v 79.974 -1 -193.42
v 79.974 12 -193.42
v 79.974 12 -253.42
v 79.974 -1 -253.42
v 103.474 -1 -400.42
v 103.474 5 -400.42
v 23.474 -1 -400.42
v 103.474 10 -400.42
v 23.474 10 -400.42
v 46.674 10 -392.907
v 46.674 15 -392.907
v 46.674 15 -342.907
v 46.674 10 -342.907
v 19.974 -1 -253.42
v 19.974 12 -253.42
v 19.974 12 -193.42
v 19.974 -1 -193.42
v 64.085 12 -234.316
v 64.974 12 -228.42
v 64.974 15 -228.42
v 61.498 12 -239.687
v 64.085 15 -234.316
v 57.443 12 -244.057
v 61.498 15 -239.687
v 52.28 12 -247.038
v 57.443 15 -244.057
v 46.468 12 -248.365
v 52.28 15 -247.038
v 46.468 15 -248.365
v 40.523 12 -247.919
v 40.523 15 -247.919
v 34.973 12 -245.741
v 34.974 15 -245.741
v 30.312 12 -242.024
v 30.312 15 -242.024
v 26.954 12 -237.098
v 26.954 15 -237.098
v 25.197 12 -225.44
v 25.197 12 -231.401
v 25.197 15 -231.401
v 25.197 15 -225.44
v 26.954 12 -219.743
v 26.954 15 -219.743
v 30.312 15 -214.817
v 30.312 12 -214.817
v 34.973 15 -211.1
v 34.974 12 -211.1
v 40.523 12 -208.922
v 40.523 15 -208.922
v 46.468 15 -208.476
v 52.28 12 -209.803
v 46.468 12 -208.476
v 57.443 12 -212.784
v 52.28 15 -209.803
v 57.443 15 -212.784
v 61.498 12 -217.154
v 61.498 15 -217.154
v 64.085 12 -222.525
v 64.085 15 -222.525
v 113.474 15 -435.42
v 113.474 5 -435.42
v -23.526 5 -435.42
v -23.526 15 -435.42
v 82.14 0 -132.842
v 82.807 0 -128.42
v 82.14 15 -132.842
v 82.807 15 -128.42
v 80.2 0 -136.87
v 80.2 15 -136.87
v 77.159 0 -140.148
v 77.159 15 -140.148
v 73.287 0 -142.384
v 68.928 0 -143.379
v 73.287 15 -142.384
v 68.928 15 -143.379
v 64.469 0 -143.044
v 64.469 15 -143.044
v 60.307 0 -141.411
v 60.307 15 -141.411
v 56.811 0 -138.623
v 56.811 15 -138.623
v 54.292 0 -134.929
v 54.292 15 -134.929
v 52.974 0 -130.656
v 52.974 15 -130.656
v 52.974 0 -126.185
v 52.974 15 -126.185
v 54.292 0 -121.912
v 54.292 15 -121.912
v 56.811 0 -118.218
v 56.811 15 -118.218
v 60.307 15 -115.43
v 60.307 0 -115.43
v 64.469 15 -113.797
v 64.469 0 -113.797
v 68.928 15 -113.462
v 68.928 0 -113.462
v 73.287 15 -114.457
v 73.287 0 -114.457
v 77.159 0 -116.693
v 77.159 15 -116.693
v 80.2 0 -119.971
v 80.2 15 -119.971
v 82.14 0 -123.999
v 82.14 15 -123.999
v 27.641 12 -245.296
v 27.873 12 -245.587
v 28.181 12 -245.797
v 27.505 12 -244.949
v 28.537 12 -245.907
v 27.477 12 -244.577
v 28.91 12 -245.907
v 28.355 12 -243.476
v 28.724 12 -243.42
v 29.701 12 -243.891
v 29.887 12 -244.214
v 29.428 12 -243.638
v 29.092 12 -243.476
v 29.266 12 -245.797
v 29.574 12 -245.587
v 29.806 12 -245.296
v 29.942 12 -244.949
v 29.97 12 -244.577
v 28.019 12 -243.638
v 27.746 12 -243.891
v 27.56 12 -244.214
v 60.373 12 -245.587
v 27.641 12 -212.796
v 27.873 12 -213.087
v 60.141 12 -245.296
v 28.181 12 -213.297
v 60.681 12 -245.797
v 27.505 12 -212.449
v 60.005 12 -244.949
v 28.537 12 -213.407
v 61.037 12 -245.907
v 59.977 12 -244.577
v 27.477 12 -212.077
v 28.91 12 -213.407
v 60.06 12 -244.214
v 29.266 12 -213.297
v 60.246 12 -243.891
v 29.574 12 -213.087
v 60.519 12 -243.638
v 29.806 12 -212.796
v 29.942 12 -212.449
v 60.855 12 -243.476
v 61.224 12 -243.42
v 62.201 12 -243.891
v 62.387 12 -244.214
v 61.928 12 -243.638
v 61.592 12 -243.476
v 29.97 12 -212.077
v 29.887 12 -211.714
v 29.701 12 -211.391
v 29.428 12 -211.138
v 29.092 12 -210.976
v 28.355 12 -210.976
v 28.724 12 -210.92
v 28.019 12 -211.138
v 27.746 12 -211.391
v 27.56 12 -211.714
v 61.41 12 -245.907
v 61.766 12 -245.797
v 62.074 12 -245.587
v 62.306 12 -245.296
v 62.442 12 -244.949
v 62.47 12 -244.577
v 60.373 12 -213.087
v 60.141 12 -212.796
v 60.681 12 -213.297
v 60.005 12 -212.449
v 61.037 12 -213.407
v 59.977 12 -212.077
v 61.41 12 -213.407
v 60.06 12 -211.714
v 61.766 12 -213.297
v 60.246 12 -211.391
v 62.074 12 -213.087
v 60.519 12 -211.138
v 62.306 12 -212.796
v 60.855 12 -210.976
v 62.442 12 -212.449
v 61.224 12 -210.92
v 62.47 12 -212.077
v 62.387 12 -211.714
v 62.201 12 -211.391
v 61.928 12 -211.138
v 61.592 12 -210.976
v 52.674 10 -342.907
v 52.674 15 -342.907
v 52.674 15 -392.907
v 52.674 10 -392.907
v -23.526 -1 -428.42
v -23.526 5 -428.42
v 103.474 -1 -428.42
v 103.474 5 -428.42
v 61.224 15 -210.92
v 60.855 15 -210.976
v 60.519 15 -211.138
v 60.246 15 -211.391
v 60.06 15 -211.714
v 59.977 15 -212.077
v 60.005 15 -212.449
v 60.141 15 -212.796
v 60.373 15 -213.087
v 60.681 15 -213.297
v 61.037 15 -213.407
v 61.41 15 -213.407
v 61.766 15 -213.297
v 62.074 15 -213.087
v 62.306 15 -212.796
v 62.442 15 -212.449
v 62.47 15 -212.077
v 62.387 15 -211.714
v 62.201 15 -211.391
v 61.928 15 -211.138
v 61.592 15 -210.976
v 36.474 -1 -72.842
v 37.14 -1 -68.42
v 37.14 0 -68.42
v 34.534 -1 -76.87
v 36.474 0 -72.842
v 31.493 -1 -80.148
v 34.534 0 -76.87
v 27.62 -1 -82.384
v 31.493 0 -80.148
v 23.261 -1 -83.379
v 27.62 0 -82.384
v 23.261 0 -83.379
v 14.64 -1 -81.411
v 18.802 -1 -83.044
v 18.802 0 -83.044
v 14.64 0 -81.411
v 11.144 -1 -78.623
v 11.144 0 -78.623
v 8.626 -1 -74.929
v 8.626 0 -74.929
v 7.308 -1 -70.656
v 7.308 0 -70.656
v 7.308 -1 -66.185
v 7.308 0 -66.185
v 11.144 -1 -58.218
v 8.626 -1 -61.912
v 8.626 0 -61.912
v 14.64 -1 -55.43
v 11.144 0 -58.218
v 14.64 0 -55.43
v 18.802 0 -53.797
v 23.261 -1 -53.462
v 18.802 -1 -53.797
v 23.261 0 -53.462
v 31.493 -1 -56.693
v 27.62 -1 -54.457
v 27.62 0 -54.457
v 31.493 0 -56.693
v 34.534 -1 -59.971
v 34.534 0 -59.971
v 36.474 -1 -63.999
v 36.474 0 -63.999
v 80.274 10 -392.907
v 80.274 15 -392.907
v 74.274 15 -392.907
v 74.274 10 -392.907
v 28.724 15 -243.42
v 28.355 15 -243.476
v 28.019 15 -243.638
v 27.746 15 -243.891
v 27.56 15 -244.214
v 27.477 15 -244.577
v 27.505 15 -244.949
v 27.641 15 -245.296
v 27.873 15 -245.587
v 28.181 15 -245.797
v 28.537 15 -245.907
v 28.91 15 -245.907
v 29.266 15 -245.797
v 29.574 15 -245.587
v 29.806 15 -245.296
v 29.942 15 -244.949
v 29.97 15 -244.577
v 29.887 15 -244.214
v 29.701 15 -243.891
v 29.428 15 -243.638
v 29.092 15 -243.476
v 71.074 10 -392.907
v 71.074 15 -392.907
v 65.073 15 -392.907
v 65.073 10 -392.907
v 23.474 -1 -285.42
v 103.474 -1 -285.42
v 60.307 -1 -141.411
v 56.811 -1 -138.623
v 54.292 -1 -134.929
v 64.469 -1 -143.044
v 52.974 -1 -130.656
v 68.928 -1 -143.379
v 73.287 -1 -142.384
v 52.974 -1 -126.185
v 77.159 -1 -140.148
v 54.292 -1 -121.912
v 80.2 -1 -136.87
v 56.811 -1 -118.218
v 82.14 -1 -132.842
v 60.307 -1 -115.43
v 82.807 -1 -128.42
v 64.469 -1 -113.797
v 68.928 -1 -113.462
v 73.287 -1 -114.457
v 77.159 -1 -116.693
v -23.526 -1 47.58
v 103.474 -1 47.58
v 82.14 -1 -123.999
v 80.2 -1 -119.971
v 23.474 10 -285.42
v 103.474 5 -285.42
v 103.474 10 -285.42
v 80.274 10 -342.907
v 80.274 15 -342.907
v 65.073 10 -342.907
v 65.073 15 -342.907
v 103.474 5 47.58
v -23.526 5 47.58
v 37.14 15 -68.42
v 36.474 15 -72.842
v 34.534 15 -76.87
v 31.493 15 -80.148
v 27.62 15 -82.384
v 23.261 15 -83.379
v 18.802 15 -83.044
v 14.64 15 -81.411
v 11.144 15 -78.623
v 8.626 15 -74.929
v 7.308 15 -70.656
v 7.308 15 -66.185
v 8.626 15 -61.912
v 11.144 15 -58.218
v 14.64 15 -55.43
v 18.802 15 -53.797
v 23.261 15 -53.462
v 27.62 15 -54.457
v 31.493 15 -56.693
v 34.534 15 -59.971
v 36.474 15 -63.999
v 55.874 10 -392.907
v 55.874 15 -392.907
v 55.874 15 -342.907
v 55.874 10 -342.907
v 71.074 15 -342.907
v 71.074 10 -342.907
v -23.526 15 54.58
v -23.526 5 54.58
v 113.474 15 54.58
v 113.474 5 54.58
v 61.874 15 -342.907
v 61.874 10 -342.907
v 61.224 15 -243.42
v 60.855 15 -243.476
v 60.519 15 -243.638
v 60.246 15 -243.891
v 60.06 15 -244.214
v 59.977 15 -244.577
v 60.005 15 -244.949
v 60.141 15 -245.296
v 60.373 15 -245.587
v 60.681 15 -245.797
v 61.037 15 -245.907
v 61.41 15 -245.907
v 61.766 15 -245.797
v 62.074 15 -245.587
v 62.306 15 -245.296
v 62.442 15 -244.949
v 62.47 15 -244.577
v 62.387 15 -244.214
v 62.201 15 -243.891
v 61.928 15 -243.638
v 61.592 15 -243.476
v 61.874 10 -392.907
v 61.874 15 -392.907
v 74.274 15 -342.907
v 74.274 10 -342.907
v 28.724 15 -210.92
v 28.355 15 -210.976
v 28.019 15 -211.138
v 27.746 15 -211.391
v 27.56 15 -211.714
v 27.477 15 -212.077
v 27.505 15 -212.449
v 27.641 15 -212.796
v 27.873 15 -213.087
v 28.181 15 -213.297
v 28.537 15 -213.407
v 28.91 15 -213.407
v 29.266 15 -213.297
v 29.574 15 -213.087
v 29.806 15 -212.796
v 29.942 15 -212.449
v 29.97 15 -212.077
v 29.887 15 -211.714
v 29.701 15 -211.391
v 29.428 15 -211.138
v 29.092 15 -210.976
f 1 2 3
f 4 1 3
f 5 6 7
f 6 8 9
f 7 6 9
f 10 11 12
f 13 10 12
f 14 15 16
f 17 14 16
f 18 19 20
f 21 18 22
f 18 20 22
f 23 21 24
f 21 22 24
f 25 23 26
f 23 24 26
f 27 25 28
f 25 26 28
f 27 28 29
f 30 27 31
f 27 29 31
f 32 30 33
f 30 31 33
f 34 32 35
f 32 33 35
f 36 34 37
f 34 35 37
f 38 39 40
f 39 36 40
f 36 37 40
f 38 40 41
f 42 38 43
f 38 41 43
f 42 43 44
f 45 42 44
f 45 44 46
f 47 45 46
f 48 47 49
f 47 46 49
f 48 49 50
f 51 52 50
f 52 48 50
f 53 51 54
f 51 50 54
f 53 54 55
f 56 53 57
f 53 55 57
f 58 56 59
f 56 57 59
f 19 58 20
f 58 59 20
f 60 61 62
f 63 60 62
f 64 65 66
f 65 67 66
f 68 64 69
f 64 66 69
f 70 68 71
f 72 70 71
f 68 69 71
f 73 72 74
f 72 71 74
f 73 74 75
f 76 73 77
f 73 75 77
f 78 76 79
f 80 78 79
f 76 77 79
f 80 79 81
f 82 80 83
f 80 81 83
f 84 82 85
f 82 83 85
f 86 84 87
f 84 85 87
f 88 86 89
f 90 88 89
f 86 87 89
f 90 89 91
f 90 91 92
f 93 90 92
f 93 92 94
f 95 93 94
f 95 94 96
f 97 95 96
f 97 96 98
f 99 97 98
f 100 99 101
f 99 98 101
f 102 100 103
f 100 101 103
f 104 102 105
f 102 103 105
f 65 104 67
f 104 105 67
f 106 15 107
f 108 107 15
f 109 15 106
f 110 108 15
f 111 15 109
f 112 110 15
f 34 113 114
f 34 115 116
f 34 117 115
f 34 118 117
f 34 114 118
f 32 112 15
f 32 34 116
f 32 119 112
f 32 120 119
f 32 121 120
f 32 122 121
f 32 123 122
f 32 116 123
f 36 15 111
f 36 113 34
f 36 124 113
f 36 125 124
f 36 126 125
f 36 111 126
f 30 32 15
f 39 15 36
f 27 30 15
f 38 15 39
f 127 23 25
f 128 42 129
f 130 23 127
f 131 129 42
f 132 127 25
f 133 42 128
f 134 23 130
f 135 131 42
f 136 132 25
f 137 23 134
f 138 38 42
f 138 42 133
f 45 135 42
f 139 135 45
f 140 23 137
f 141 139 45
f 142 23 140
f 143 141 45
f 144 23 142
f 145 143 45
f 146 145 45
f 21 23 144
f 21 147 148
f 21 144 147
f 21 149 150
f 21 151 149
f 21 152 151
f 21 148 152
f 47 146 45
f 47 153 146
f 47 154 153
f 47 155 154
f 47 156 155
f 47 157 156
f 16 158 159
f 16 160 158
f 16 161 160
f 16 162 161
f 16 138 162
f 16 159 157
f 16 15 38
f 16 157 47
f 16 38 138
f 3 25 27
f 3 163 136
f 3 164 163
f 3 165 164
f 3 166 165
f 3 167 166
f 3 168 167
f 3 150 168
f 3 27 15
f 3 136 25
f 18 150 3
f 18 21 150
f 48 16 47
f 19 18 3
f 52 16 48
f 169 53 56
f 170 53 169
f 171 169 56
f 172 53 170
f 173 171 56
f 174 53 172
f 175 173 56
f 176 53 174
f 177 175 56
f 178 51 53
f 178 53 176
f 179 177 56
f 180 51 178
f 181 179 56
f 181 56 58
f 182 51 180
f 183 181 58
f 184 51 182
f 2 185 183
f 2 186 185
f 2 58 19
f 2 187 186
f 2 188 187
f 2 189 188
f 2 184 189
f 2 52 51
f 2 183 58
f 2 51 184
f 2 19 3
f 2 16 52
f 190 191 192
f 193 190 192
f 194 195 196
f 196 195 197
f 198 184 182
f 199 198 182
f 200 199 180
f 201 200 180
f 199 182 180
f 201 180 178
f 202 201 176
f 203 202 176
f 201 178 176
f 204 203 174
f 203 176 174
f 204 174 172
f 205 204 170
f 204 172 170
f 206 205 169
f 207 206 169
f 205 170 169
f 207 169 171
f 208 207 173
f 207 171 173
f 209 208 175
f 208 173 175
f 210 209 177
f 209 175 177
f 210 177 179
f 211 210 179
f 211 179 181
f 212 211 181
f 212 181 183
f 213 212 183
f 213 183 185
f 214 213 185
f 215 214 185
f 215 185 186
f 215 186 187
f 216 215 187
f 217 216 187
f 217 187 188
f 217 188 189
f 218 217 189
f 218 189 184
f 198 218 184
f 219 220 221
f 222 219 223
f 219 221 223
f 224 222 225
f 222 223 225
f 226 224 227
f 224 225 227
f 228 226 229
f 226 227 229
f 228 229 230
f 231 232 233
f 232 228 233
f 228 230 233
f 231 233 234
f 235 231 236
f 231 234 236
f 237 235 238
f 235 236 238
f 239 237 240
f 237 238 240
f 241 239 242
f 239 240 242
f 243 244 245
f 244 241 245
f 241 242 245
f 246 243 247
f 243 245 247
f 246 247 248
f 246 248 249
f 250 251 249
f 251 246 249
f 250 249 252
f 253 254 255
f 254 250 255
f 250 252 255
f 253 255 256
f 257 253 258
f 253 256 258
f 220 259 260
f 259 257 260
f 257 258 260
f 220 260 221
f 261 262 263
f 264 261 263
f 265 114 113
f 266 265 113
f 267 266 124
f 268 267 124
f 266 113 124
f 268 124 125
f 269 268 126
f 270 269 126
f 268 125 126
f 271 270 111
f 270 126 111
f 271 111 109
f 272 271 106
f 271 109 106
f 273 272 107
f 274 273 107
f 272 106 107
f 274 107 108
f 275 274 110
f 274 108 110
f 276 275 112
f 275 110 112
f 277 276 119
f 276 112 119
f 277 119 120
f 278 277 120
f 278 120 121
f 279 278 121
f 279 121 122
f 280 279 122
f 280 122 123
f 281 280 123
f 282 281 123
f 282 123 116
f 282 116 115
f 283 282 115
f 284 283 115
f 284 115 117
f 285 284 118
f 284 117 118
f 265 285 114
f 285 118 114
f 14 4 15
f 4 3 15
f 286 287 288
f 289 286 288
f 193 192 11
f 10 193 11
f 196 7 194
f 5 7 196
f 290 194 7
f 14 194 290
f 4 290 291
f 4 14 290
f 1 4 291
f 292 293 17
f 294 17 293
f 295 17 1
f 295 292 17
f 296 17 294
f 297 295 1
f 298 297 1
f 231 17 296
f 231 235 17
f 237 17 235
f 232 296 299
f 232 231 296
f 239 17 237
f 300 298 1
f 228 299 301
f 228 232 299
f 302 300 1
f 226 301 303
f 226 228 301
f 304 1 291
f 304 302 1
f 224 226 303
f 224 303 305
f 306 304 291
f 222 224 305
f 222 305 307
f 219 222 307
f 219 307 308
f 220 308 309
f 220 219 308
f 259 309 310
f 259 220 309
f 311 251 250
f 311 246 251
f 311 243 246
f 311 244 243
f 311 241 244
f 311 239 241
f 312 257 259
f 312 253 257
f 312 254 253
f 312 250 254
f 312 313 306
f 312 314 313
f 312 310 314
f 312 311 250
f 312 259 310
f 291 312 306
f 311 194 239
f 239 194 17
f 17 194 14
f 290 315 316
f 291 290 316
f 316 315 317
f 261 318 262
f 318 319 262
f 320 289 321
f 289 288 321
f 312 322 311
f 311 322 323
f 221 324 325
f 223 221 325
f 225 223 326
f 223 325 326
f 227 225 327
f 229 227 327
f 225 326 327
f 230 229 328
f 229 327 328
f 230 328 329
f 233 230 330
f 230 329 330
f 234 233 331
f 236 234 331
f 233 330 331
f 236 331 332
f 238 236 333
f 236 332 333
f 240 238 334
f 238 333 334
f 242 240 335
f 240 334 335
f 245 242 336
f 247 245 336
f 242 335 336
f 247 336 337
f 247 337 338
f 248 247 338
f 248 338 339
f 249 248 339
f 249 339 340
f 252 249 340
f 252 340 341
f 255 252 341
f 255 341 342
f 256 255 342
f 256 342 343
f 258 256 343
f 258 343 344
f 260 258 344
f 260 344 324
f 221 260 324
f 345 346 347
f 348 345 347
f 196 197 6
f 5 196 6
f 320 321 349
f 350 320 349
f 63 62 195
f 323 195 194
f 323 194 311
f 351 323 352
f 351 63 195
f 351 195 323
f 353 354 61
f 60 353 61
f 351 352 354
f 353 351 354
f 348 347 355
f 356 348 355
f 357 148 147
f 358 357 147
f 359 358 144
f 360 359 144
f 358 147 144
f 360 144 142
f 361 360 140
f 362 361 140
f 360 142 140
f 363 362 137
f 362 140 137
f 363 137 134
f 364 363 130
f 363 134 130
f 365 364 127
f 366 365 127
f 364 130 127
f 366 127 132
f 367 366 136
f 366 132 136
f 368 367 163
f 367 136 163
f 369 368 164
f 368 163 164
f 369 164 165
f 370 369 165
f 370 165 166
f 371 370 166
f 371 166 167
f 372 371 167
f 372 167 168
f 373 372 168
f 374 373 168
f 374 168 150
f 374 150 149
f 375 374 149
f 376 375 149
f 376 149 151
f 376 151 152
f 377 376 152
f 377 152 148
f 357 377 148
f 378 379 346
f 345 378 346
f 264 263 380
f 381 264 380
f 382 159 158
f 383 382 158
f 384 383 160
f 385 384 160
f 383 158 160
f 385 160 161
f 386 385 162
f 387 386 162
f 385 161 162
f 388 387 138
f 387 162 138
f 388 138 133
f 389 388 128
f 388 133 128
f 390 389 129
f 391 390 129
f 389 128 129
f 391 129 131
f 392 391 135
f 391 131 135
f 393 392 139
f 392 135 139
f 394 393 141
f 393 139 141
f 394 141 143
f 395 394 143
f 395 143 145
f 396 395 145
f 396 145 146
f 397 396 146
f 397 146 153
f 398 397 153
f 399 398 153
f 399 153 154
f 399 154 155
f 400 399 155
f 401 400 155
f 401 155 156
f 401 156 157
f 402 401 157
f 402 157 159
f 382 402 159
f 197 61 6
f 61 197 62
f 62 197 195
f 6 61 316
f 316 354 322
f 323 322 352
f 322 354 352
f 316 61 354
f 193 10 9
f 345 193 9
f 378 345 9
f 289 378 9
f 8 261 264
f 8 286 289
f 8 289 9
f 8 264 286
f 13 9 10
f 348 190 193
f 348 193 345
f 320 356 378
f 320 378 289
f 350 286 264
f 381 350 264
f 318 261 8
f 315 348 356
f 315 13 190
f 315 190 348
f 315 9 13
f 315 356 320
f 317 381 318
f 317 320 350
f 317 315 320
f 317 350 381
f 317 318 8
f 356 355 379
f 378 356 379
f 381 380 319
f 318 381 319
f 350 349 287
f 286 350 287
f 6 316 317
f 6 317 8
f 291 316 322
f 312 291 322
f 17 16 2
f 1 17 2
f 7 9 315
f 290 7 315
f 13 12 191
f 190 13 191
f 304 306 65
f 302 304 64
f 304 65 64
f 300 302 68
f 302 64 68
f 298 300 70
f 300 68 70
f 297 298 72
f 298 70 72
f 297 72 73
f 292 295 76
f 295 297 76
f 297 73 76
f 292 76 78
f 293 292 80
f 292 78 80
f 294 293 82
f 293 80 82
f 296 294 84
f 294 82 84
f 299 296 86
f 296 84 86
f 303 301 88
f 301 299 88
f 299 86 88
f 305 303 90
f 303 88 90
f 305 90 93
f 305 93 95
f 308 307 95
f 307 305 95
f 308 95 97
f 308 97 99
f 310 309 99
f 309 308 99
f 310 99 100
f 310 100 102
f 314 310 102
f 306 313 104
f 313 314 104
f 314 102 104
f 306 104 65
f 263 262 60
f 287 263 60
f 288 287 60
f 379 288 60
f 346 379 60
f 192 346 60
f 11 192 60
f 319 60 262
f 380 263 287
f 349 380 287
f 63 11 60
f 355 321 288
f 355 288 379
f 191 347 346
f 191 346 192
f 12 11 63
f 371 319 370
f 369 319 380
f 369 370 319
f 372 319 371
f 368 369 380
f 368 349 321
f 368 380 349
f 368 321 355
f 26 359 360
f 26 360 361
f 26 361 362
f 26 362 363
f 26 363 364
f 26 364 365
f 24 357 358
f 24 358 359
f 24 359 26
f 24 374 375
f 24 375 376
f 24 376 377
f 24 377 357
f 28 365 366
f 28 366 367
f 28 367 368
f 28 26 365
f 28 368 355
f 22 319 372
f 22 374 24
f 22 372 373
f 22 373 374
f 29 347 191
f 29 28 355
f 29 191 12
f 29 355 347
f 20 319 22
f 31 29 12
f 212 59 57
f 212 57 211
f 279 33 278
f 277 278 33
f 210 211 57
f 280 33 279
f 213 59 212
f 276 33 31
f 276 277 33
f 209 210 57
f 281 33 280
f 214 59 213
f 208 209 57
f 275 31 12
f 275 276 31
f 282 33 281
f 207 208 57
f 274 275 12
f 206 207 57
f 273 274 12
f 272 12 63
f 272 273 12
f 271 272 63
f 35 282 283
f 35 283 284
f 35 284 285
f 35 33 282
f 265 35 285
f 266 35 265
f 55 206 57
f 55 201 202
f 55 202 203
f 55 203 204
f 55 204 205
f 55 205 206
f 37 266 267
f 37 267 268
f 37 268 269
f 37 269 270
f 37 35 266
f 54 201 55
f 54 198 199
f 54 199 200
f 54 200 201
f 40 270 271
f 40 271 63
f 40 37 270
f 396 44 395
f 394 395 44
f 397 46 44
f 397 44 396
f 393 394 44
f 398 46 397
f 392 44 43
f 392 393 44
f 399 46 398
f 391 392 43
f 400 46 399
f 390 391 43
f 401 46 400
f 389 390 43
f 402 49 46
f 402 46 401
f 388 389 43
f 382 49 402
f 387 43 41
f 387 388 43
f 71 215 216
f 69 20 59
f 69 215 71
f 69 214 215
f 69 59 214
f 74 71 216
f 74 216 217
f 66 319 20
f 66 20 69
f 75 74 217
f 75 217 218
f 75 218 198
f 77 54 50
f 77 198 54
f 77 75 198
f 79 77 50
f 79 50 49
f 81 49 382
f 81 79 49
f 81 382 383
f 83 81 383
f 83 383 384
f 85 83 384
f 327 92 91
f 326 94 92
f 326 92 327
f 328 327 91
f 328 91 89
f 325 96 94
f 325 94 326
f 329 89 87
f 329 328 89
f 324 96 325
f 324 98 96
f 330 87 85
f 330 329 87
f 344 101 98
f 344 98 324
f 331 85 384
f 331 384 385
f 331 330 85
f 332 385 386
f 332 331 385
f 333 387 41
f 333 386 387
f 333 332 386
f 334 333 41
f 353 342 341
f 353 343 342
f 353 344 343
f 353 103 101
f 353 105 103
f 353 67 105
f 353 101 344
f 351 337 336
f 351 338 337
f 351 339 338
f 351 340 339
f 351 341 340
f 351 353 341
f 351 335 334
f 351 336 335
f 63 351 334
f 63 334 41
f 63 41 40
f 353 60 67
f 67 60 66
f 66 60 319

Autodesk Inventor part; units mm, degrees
ref_plane "YZ Plane" through (0, 0, 0) normal (1, 0, 0) x (0, 1, 0)
ref_plane "XZ Plane" through (0, 0, 0) normal (0, 1, 0) x (-1, 0, 0)
ref_plane "XY Plane" through (0, 0, 0) normal (0, 0, 1) x (1, 0, 0)
sketch "Sketch1" plane through (0, 0, 0) normal (0, 1, 0) x (-1, 0, 0)
  line L0 (23.5265, 54.5795) -> (-113.4735, 54.5795)
  line L1 (-113.4735, 54.5795) -> (-113.4735, -435.4205)
  line L2 (-113.4735, -435.4205) -> (23.5265, -435.4205)
  line L3 (23.5265, -435.4205) -> (23.5265, 54.5795)
  point P0 (0, 0)
  dimension "d0" = 137
  dimension "d1" = 490
extrude "Extrusion1" add sketch "Sketch1" along normal blind 15
sketch "Sketch2" plane through (-23.5265, 0, 54.5795) normal (0, 0, 1) x (1, 0, 0)
  line L0 (137, 0) -> (0, 0) projected
  line L1 (0, 0) -> (127, 0)
  line L2 (127, 0) -> (127, 5)
  line L3 (127, 5) -> (0, 5)
  line L4 (0, 5) -> (0, 0)
  point P0 (23.5265, 0)
  dimension "d4" = 127
  dimension "d5" = 5
extrude "Extrusion2" cut sketch "Sketch2" against normal blind 7
sketch "Sketch3" plane through (113.4735, 0, -435.4205) normal (0, 0, -1) x (-1, 0, 0)
  line L0 (0, 0) -> (137, 0) projected
  line L1 (0, 0) -> (137, 0)
  line L2 (137, 0) -> (137, 5)
  line L3 (137, 5) -> (0, 5)
  line L4 (0, 5) -> (0, 0)
  point P0 (113.4735, 0)
  dimension "d8" = 137
  dimension "d9" = 5
extrude "Extrusion3" cut sketch "Sketch3" against normal blind 7
sketch "Sketch4" plane through (0, 0, 0) normal (0, -1, 0) x (1, 0, 0)
  line L0 (-23.5265, -428.4205) -> (113.4735, -428.4205) projected
  line L1 (103.4735, 47.5795) -> (-23.5265, 47.5795) projected
  line L2 (113.4735, -428.4205) -> (103.4735, -428.4205)
  line L3 (103.4735, -428.4205) -> (103.4735, 47.5795)
  line L4 (103.4735, 47.5795) -> (113.4735, 47.5795)
  line L5 (113.4735, 47.5795) -> (113.4735, -428.4205)
  point P0 (0, 0)
  point P1 (-13.5265, -428.4205)
  dimension "d12" = 10
  dimension "d13" = 476
extrude "Extrusion4" cut sketch "Sketch4" against normal blind 5
sketch "Sketch5" plane through (0, 15, 0) normal (0, 1, 0) x (1, 0, 0)
  circle A0 centre (22.1402, 68.4205) radius 15
  circle A1 centre (67.8068, 128.4205) radius 15
  circle A2 centre (44.9735, 228.4205) radius 20
  line L0 (103.4735, 428.4205) -> (-23.5265, 428.4205) projected
  line L1 (-23.5265, 435.4205) -> (-23.5265, -54.5795) projected
  point P0 (0, 0)
  point P1 (-13.5265, 428.4205)
  dimension "d16" = 40
  dimension "d17" = 200
  dimension "d18" = 68.5
  dimension "d19" = 300
  dimension "d20" = 91.3333
  dimension "d21" = 45.6667
  dimension "d22" = 360
  dimension "d23" = 30
  dimension "d24" = 30
extrude "Extrusion5" cut sketch "Sketch5" against normal blind 15
sketch "Sketch6" plane through (0, 0, 0) normal (0, -1, 0) x (1, 0, 0)
  line L0 (69.9735, -253.4205) -> (19.9735, -253.4205)
  line L1 (19.9735, -253.4205) -> (19.9735, -203.4205)
  line L2 (19.9735, -203.4205) -> (69.9735, -203.4205)
  line L3 (69.9735, -203.4205) -> (69.9735, -253.4205)
  circle A0 centre (44.9735, -228.4205) radius 20 projected
  point P0 (0, 0)
  dimension "d27" = 25
  dimension "d28" = 50
  dimension "d29" = 25
  dimension "d30" = 50
extrude "Extrusion6" cut sketch "Sketch6" against normal blind 12
sketch "Sketch7" plane through (0, 15, 0) normal (0, 1, 0) x (1, 0, 0)
  circle A0 centre (44.9735, 228.4205) radius 20 projected
  point P0 (0, 0)
  point P1 (28.7235, 212.1705)
  point P2 (28.7235, 244.6705)
  point P3 (61.2235, 244.6705)
  point P4 (61.2235, 212.1705)
  dimension "d33" = 16.25
  dimension "d34" = 16.25
  dimension "d35" = 16.25
  dimension "d36" = 16.25
  dimension "d37" = 16.25
  dimension "d38" = 16.25
  dimension "d39" = 16.25
  dimension "d40" = 16.25
hole "Hole1" at (28.7235, 15, -212.1705) at (28.7235, 15, -244.6705) at (61.2235, 15, -244.6705) at (61.2235, 15, -212.1705) direction (0, -1, 0) diameter 2.5 end through all
sketch "Sketch8" plane through (0, 0, 0) normal (0, -1, 0) x (1, 0, 0)
  circle A0 centre (61.2235, -244.6705) radius 1.25 projected
  circle A1 centre (28.7235, -212.1705) radius 1.25 projected
  circle A2 centre (28.7235, -244.6705) radius 1.25 projected
  circle A3 centre (61.2235, -212.1705) radius 1.25 projected
  line L0 (19.9735, -203.4205) -> (69.9735, -203.4205) projected
  line L1 (19.9735, -253.4205) -> (19.9735, -203.4205) projected
  line L2 (69.9735, -253.4205) -> (19.9735, -253.4205) projected
  line L3 (69.9735, -203.4205) -> (69.9735, -253.4205) projected
  circle A4 centre (44.9735, -228.4205) radius 20 projected
  line L4 (69.9735, -203.4205) -> (69.9735, -253.4205) projected
  line L5 (69.9735, -253.4205) -> (79.9735, -253.4205)
  line L6 (79.9735, -253.4205) -> (79.9735, -203.4205)
  line L7 (79.9735, -203.4205) -> (69.9735, -203.4205)
  line L8 (69.9735, -203.4205) -> (69.9735, -253.4205)
  line L9 (79.9735, -203.4205) -> (19.9735, -203.4205)
  line L10 (19.9735, -203.4205) -> (19.9735, -193.4205)
  line L11 (19.9735, -193.4205) -> (79.9735, -193.4205)
  line L12 (79.9735, -193.4205) -> (79.9735, -203.4205)
  point P0 (0, 0)
  dimension "d48" = 10
  dimension "d49" = 50
  dimension "d50" = 60
  dimension "d51" = 10
extrude "Extrusion7" cut sketch "Sketch8" against normal blind 12 contours L10 L11 L12 L7 L0 | L7 L6 L5 L3
sketch "Sketch9" plane through (0, 15, 0) normal (0, 1, 0) x (1, 0, 0)
  line L0 (43.4735, 338.4205) -> (83.4735, 338.4205)
  line L1 (83.4735, 338.4205) -> (83.4735, 398.4205)
  line L2 (83.4735, 398.4205) -> (43.4735, 398.4205)
  line L3 (43.4735, 398.4205) -> (43.4735, 338.4205)
  line L4 (103.4735, 428.4205) -> (-23.5265, 428.4205) projected
  line L5 (113.4735, -54.5795) -> (113.4735, 435.4205) projected
  line L6 (46.6735, 342.9072) -> (52.6735, 342.9072)
  line L7 (52.6735, 342.9072) -> (52.6735, 392.9072)
  line L8 (52.6735, 392.9072) -> (46.6735, 392.9072)
  line L9 (46.6735, 392.9072) -> (46.6735, 342.9072)
  line L10 (55.8735, 342.9072) -> (61.8735, 342.9072)
  line L11 (61.8735, 342.9072) -> (61.8735, 392.9072)
  line L12 (61.8735, 392.9072) -> (55.8735, 392.9072)
  line L13 (55.8735, 392.9072) -> (55.8735, 342.9072)
  line L14 (65.0735, 342.9072) -> (71.0735, 342.9072)
  line L15 (71.0735, 342.9072) -> (71.0735, 392.9072)
  line L16 (71.0735, 392.9072) -> (65.0735, 392.9072)
  line L17 (65.0735, 392.9072) -> (65.0735, 342.9072)
  line L18 (74.2735, 342.9072) -> (80.2735, 342.9072)
  line L19 (80.2735, 342.9072) -> (80.2735, 392.9072)
  line L20 (80.2735, 392.9072) -> (74.2735, 392.9072)
  line L21 (74.2735, 392.9072) -> (74.2735, 342.9072)
  point P0 (0, 0)
  point P1 (-13.5265, 428.4205)
  dimension "d54" = 60
  dimension "d55" = 40
  dimension "d56" = 30
  dimension "d57" = 30
  dimension "d58" = 50
  dimension "d59" = 50
  dimension "d60" = 6
  dimension "d61" = 6
  dimension "d62" = 6
  dimension "d63" = 6
  dimension "d64" = 3.2
  dimension "d65" = 3.2
  dimension "d66" = 3.2
  dimension "d67" = 3.2
extrude "Extrusion8" cut sketch "Sketch9" against normal blind 15 contours L9 L8 L7 L6 | L13 L12 L11 L10 | L17 L16 L15 L14 | L21 L20 L19 L18
sketch "Sketch11" plane through (0, 0, 0) normal (0, -1, 0) x (1, 0, 0)
  line L0 (103.4735, -400.4205) -> (23.4735, -400.4205)
  line L1 (23.4735, -400.4205) -> (23.4735, -285.4205)
  line L2 (23.4735, -285.4205) -> (103.4735, -285.4205)
  line L3 (103.4735, -285.4205) -> (103.4735, -400.4205)
  line L4 (113.4735, 47.5795) -> (113.4735, -435.4205) projected
  line L5 (113.4735, -435.4205) -> (-23.5265, -435.4205) projected
  point P0 (0, 0)
  point P1 (-13.5265, -435.4205)
  dimension "d70" = 80
  dimension "d71" = 115
  dimension "d72" = 10
  dimension "d73" = 35
extrude "Extrusion9" cut sketch "Sketch11" against normal blind 10
sketch "Sketch12" plane through (-23.5265, 15, 54.5795) normal (0, 0, 1) x (1, 0, 0)
  line L0 (0, 0) -> (137, 0) projected
  line L1 (137, -121) -> (137, 0) projected
  line L2 (127, -15) -> (137, -15) projected
  line L3 (127, -10) -> (127, -121) projected
  line L4 (0, -10) -> (127, -10) projected
  line L5 (127, -10) -> (127, -121) projected
  line L6 (0, -10) -> (127, -10) projected
  line L7 (137, -15) -> (137, -10) projected
  line L8 (127, -10) -> (137, -10)
  line L9 (137, -10) -> (137, -15)
  line L10 (137, -15) -> (127, -15)
  line L11 (127, -15) -> (127, -10)
  point P0 (23.5265, -15)
extrude "Extrusion10" cut sketch "Sketch12" against normal blind 7
sketch "Sketch13" plane through (0, 0, 0) normal (0, -1, 0) x (1, 0, 0)
  line L0 (23.4735, -285.4205) -> (103.4735, -285.4205) projected
  line L1 (103.4735, -285.4205) -> (103.4735, 47.5795) projected
  line L2 (103.4735, 47.5795) -> (-23.5265, 47.5795) projected
  line L3 (-23.5265, -428.4205) -> (-23.5265, 47.5795) projected
  line L4 (-23.5265, -428.4205) -> (103.4735, -428.4205) projected
  line L5 (103.4735, -428.4205) -> (103.4735, -400.4205) projected
  line L6 (103.4735, -400.4205) -> (23.4735, -400.4205) projected
  line L7 (23.4735, -400.4205) -> (23.4735, -285.4205) projected
  circle A0 centre (67.8068, -128.4205) radius 15 projected
  circle A1 centre (22.1402, -68.4205) radius 15 projected
  line L8 (19.9735, -253.4205) -> (19.9735, -193.4205) projected
  line L9 (19.9735, -193.4205) -> (79.9735, -193.4205) projected
  line L10 (79.9735, -193.4205) -> (79.9735, -253.4205) projected
  line L11 (79.9735, -253.4205) -> (19.9735, -253.4205) projected
  line L12 (-23.5265, -435.4205) -> (-23.5265, -428.4205) projected
  line L13 (103.4735, -285.4205) -> (103.4735, 47.5795) projected
  line L14 (-23.5265, -428.4205) -> (103.4735, -428.4205)
  line L15 (103.4735, -428.4205) -> (103.4735, 47.5795)
  line L16 (103.4735, 47.5795) -> (-23.5265, 47.5795)
  line L17 (-23.5265, 47.5795) -> (-23.5265, -428.4205)
  point P0 (0, 0)
extrude "Extrusion11" add sketch "Sketch13" along normal blind 1 contours L7 L6 L5 L4 L3 L2 L1 L0
properties part number "Arcade_ControlTop"
